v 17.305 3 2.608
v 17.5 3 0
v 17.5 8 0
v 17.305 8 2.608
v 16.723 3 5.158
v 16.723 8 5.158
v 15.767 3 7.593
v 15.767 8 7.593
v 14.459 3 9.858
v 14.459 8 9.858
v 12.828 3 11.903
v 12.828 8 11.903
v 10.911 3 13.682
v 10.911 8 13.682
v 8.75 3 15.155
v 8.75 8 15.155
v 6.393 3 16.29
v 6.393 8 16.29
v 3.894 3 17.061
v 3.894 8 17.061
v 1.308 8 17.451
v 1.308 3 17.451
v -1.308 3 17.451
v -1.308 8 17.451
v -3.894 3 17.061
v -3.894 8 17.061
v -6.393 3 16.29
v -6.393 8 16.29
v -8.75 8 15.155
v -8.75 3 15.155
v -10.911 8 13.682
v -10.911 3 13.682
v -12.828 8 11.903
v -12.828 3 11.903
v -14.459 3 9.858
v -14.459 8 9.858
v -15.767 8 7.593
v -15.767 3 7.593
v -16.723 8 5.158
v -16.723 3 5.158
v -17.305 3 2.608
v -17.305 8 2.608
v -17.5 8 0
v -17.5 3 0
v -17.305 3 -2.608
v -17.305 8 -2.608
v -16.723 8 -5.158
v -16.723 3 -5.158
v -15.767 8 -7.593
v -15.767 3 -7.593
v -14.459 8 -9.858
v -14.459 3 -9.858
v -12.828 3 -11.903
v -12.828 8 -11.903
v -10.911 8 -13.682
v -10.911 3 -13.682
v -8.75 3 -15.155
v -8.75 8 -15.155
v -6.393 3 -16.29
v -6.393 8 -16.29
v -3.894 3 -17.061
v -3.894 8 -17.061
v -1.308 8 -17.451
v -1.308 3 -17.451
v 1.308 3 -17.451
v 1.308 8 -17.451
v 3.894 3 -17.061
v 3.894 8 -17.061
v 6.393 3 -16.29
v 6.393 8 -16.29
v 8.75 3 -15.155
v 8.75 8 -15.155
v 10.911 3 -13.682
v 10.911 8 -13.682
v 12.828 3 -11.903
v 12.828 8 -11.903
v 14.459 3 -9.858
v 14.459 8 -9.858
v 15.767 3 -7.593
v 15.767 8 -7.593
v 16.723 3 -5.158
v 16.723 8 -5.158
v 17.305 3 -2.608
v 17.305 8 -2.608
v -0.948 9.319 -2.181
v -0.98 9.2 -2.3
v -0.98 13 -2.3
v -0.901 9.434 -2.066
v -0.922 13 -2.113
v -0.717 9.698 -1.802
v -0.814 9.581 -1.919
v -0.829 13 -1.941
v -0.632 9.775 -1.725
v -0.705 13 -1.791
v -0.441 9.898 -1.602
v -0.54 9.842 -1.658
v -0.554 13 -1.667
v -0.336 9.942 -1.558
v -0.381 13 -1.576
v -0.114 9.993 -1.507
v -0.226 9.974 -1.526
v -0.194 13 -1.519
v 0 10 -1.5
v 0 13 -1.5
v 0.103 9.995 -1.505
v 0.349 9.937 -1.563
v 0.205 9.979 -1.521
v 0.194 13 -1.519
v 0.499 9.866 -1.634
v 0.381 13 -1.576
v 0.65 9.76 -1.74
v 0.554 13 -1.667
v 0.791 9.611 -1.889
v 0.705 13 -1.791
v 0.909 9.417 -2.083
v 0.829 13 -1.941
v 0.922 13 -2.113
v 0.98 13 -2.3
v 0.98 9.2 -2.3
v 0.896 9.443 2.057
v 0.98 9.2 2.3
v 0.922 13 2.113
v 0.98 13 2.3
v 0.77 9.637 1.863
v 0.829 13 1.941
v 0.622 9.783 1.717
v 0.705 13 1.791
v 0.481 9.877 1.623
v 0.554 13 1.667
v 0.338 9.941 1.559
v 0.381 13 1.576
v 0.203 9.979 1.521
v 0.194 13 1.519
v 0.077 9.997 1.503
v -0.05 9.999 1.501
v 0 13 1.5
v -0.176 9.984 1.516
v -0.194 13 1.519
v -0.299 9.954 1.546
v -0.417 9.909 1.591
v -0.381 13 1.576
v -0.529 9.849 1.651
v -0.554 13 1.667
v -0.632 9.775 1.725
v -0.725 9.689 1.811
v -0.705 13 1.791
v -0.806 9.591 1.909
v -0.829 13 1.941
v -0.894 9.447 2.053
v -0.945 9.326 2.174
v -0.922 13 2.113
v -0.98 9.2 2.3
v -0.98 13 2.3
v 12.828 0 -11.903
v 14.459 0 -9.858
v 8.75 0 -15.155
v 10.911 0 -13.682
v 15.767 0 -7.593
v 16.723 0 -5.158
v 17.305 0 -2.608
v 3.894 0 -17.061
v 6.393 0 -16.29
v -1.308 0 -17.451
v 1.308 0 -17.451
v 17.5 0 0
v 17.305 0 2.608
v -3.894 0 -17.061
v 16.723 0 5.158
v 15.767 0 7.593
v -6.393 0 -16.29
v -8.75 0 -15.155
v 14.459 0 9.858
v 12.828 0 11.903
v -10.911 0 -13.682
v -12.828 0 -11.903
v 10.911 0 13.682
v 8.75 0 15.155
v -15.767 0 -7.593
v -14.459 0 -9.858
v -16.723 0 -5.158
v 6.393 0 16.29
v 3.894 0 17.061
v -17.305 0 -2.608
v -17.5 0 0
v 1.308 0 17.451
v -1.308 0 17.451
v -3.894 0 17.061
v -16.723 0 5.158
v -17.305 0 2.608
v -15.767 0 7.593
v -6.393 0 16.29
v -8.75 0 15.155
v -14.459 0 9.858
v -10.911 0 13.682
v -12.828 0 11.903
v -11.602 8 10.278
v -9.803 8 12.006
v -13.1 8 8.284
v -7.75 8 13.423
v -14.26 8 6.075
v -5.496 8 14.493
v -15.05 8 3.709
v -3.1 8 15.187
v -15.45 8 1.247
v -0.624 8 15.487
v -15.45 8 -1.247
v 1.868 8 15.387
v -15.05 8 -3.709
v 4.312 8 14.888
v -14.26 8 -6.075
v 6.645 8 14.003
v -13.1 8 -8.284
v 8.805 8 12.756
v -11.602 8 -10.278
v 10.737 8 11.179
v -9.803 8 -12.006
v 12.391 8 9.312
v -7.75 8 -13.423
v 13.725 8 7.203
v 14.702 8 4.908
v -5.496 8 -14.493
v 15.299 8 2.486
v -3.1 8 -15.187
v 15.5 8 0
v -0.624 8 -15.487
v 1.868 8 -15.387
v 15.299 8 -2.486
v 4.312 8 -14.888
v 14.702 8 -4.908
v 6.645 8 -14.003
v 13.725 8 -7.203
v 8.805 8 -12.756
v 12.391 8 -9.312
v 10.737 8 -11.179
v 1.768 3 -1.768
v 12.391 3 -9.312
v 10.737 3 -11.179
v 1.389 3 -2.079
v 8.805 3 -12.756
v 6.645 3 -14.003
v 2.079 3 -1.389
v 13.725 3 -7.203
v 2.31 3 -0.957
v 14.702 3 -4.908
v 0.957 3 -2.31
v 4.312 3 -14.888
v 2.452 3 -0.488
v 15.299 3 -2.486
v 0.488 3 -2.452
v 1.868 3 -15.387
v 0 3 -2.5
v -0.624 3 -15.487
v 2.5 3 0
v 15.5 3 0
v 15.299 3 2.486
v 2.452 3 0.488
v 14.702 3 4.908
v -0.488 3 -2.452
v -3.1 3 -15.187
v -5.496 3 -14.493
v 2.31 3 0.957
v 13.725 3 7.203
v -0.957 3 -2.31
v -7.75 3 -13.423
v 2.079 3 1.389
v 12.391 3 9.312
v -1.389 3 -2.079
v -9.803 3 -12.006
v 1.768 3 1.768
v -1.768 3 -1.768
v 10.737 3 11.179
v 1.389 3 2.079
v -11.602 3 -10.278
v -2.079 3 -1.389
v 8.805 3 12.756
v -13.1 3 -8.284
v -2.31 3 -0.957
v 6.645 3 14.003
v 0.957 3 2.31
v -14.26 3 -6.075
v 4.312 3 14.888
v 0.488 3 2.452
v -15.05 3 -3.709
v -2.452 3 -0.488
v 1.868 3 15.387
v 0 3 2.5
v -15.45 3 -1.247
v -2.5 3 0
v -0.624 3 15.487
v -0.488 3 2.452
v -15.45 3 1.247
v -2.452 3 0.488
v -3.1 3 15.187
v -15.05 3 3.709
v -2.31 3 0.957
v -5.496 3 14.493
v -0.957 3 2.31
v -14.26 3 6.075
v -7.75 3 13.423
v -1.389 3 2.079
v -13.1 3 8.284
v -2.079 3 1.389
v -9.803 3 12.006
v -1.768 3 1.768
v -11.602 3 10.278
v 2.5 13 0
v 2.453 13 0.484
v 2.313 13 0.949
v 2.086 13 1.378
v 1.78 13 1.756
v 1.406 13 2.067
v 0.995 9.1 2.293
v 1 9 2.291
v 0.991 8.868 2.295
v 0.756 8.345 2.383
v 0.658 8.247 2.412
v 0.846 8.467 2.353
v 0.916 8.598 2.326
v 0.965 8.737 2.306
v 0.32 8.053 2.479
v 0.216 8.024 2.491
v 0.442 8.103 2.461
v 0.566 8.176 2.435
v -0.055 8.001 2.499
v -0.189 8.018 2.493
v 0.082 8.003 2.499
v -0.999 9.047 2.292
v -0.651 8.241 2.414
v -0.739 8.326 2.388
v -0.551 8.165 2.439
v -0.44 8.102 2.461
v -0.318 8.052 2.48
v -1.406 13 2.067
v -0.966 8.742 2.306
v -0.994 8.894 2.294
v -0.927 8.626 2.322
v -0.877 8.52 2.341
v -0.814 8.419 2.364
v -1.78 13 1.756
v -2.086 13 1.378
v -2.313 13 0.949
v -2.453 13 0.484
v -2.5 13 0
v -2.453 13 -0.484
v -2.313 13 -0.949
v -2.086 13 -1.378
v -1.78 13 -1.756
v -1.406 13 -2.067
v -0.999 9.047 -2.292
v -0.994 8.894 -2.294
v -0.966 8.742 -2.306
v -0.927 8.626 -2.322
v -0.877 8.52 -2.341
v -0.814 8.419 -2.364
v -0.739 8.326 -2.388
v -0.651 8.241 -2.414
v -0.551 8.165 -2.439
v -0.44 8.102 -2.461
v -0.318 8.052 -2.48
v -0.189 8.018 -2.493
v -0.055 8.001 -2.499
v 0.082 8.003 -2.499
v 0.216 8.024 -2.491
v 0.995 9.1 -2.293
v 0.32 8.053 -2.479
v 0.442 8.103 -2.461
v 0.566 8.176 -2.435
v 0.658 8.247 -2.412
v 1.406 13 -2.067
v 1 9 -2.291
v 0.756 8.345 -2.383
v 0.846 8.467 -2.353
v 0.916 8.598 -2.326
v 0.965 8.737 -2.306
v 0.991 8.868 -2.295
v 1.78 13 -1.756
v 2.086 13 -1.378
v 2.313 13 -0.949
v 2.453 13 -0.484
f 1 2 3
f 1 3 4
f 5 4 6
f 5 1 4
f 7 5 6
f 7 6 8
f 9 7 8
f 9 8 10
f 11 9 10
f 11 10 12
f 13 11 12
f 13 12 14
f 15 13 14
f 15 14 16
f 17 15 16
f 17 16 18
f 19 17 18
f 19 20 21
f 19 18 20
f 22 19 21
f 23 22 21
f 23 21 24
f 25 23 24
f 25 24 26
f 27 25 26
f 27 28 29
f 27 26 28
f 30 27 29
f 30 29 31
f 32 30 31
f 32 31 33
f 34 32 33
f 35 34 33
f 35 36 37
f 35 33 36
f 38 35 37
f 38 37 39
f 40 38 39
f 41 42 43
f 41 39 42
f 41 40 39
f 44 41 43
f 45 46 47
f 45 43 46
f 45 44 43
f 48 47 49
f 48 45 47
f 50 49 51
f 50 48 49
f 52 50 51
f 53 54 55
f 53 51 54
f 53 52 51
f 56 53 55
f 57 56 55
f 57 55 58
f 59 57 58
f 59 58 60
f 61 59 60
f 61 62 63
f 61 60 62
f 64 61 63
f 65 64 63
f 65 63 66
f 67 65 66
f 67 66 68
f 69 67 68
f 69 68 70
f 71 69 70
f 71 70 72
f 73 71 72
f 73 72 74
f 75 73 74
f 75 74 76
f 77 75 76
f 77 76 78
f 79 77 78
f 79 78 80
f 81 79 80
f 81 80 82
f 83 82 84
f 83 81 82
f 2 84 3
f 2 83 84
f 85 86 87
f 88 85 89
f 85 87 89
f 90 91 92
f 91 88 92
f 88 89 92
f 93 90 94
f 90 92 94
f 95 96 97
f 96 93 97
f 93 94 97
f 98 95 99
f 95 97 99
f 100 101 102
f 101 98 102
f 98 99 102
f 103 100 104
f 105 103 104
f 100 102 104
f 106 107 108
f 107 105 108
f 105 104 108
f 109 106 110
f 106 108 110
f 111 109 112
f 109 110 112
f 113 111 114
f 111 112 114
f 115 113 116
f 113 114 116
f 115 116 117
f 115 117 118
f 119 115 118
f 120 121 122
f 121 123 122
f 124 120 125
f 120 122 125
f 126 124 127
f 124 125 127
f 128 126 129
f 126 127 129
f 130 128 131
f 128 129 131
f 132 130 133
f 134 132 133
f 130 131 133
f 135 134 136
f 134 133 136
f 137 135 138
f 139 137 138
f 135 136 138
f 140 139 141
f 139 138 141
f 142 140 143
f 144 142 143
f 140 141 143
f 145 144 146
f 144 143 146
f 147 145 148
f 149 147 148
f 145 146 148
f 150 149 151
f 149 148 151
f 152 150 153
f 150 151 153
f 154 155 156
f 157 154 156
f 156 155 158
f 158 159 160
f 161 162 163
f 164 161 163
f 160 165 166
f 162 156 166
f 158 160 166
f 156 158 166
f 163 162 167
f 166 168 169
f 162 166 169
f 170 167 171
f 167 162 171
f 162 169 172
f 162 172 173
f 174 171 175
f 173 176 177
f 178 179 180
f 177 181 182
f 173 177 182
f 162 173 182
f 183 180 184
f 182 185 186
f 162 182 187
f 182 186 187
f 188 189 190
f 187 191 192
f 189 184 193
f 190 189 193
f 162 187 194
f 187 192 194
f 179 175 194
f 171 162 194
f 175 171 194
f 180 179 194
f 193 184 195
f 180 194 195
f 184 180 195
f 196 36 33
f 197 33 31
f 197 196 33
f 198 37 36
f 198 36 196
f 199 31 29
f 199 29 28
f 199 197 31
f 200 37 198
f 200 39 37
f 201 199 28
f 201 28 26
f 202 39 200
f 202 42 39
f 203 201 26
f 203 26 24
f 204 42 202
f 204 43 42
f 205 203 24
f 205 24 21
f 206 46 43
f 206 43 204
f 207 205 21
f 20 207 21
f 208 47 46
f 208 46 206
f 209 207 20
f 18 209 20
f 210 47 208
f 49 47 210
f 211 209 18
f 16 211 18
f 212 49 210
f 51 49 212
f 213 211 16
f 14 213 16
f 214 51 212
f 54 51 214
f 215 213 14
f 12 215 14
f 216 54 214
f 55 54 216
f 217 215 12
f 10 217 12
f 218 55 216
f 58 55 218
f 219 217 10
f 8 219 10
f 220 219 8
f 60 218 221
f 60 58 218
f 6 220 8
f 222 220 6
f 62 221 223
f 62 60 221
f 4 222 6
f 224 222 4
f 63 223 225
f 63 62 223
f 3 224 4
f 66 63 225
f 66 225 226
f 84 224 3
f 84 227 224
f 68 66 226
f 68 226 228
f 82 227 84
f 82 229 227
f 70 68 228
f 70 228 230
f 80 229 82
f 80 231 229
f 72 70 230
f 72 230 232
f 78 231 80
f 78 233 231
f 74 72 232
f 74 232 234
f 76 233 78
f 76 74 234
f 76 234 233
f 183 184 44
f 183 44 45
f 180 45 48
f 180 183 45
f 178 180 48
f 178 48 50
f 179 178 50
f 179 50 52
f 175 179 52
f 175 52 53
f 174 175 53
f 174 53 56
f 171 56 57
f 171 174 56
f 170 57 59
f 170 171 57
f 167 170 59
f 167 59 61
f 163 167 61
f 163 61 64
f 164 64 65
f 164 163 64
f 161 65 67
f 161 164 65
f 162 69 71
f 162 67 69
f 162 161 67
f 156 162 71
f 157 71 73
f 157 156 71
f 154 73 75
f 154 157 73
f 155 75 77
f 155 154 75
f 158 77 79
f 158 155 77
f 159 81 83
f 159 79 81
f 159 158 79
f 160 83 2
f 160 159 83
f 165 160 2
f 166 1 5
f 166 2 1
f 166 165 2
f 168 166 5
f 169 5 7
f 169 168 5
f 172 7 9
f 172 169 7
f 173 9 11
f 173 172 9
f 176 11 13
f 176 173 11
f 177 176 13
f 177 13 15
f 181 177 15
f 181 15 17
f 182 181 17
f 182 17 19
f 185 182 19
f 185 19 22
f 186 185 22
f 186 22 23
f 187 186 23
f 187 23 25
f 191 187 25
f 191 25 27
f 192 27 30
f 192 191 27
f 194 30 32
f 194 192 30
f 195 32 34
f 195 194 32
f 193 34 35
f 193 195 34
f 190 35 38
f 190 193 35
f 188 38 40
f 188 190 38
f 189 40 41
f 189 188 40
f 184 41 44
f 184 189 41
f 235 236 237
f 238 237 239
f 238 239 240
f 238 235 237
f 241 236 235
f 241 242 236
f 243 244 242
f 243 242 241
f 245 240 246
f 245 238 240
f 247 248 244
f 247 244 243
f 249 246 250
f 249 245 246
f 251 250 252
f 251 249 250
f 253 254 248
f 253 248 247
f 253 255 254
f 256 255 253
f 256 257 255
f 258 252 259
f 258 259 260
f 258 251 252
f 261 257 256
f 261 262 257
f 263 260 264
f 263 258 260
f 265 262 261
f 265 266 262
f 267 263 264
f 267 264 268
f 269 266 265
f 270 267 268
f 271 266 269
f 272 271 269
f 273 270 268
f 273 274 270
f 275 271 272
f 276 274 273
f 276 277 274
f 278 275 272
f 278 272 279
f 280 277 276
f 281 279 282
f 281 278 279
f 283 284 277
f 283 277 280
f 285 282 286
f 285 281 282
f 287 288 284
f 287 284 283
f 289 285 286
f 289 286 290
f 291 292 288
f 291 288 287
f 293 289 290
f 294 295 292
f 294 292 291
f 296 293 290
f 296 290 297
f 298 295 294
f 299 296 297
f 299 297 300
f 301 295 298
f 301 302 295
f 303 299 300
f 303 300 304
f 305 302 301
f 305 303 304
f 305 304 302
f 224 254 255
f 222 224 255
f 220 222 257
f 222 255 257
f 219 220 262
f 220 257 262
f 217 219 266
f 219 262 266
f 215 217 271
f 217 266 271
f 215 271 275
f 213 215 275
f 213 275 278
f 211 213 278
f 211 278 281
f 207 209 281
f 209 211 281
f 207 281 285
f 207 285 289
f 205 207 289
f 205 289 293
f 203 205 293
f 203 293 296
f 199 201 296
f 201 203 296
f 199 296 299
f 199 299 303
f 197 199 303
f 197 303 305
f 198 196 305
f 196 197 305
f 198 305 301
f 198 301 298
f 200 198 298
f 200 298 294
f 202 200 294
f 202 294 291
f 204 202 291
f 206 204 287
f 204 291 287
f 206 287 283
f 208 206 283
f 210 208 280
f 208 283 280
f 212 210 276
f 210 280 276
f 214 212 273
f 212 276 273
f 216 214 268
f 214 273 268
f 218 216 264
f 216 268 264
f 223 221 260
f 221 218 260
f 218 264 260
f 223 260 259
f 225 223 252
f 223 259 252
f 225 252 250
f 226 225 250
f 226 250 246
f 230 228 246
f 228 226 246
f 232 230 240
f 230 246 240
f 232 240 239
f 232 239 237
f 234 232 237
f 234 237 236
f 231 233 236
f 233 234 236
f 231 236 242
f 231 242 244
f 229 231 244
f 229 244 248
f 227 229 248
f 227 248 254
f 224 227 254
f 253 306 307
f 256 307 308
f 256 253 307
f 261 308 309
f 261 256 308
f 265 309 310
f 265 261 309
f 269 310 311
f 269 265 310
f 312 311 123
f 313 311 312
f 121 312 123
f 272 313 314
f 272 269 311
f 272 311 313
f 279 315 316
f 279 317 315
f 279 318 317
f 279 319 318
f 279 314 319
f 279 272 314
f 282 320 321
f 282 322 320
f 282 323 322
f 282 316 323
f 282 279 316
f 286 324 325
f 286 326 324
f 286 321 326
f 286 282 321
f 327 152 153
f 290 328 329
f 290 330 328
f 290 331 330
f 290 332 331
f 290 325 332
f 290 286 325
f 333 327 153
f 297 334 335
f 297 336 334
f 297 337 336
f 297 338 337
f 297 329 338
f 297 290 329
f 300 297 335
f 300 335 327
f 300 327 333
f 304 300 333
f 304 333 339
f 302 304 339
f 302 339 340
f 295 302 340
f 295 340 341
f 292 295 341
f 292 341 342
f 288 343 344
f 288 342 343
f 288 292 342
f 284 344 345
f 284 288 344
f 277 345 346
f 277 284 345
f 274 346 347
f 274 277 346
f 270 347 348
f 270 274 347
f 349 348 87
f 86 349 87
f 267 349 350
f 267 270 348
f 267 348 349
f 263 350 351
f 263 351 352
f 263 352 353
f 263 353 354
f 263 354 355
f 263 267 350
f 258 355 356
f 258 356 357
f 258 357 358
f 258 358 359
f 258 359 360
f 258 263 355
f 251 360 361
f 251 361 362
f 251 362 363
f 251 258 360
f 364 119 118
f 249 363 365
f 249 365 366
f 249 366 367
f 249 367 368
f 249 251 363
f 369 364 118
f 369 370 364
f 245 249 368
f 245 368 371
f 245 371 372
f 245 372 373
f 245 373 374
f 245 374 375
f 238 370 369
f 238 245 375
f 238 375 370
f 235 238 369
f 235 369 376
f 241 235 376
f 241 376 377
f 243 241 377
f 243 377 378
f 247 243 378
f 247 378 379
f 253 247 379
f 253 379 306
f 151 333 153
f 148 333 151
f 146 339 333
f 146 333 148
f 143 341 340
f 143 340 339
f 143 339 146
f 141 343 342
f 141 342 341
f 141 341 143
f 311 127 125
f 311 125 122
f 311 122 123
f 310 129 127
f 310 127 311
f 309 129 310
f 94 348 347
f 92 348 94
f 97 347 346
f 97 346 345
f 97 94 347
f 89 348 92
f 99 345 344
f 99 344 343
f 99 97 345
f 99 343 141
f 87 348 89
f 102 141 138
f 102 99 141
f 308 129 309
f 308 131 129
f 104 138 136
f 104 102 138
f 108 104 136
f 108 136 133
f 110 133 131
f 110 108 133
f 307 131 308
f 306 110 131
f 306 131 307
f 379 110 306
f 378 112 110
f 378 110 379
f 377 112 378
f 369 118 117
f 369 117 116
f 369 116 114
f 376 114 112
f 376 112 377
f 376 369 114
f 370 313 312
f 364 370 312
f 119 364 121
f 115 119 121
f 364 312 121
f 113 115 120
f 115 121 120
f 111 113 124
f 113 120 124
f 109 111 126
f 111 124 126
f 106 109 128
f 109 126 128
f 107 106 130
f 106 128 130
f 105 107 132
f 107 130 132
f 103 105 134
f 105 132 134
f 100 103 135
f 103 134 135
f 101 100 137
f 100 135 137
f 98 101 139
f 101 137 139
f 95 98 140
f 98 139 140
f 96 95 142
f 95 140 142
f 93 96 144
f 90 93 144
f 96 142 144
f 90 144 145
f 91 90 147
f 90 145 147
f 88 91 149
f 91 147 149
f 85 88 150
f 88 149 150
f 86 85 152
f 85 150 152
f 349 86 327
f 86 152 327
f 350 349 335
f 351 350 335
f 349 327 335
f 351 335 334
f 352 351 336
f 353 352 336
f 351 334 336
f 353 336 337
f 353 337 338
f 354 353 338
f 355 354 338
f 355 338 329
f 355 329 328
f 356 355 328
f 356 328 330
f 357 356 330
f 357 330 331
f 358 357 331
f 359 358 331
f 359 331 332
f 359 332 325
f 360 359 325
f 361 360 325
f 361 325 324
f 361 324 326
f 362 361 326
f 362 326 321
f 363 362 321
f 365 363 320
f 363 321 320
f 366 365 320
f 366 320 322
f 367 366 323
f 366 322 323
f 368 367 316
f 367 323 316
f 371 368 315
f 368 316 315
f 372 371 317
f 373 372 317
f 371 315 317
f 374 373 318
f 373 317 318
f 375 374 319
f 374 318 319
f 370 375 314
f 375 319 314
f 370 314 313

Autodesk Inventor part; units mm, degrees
ref_plane "YZ Plane" through (0, 0, 0) normal (1, 0, 0) x (0, 1, 0)
ref_plane "XZ Plane" through (0, 0, 0) normal (0, 1, 0) x (-1, 0, 0)
ref_plane "XY Plane" through (0, 0, 0) normal (0, 0, 1) x (1, 0, 0)
sketch "Sketch1" plane through (0, 0, 0) normal (0, 1, 0) x (-1, 0, 0)
  circle A0 centre (0, 0) radius 17.5
  dimension "d0" = 35
extrude "Extrusion1" add sketch "Sketch1" along normal blind 3
sketch "Sketch2" plane through (0, 3, 0) normal (0, 1, 0) x (1, 0, 0)
  circle A0 centre (0, 0) radius 17.5 projected
  circle A1 centre (0, 0) radius 2.5
  dimension "d3" = 5
extrude "Extrusion2" add sketch "Sketch2" along normal blind 10 contours A1
sketch "Sketch3" plane through (0, 0, 0) normal (0, 0, 1) x (1, 0, 0)
  circle A0 centre (0, 9) radius 1
  line L0 (2.5, 13) -> (-2.5, 13) projected
  point P0 (0, 0)
  dimension "d6" = 2
  dimension "d9" = 4
extrude "Extrusion3" cut sketch "Sketch3" along normal through all both and the other way through all
sketch "Sketch4" plane through (0, 13, 0) normal (0, 1, 0) x (1, 0, 0)
  circle A0 centre (0, 0) radius 2.5 projected
  circle A1 centre (0, 2.5) radius 1
  circle A2 centre (0, -2.5) radius 1
  dimension "d10" = 2
extrude "Extrusion4" cut sketch "Sketch4" against normal blind 4 contours A1 A0 | A0 A1 | A2 A0 | A0 A2
sketch "Sketch5" plane through (0, 3, 0) normal (0, 1, 0) x (1, 0, 0)
  circle A0 centre (0, 0) radius 17.5 projected
  circle A1 centre (0, 0) radius 15.5
  dimension "d13" = 2
extrude "Extrusion5" add sketch "Sketch5" along normal blind 5
properties part number "pot_bottom"
